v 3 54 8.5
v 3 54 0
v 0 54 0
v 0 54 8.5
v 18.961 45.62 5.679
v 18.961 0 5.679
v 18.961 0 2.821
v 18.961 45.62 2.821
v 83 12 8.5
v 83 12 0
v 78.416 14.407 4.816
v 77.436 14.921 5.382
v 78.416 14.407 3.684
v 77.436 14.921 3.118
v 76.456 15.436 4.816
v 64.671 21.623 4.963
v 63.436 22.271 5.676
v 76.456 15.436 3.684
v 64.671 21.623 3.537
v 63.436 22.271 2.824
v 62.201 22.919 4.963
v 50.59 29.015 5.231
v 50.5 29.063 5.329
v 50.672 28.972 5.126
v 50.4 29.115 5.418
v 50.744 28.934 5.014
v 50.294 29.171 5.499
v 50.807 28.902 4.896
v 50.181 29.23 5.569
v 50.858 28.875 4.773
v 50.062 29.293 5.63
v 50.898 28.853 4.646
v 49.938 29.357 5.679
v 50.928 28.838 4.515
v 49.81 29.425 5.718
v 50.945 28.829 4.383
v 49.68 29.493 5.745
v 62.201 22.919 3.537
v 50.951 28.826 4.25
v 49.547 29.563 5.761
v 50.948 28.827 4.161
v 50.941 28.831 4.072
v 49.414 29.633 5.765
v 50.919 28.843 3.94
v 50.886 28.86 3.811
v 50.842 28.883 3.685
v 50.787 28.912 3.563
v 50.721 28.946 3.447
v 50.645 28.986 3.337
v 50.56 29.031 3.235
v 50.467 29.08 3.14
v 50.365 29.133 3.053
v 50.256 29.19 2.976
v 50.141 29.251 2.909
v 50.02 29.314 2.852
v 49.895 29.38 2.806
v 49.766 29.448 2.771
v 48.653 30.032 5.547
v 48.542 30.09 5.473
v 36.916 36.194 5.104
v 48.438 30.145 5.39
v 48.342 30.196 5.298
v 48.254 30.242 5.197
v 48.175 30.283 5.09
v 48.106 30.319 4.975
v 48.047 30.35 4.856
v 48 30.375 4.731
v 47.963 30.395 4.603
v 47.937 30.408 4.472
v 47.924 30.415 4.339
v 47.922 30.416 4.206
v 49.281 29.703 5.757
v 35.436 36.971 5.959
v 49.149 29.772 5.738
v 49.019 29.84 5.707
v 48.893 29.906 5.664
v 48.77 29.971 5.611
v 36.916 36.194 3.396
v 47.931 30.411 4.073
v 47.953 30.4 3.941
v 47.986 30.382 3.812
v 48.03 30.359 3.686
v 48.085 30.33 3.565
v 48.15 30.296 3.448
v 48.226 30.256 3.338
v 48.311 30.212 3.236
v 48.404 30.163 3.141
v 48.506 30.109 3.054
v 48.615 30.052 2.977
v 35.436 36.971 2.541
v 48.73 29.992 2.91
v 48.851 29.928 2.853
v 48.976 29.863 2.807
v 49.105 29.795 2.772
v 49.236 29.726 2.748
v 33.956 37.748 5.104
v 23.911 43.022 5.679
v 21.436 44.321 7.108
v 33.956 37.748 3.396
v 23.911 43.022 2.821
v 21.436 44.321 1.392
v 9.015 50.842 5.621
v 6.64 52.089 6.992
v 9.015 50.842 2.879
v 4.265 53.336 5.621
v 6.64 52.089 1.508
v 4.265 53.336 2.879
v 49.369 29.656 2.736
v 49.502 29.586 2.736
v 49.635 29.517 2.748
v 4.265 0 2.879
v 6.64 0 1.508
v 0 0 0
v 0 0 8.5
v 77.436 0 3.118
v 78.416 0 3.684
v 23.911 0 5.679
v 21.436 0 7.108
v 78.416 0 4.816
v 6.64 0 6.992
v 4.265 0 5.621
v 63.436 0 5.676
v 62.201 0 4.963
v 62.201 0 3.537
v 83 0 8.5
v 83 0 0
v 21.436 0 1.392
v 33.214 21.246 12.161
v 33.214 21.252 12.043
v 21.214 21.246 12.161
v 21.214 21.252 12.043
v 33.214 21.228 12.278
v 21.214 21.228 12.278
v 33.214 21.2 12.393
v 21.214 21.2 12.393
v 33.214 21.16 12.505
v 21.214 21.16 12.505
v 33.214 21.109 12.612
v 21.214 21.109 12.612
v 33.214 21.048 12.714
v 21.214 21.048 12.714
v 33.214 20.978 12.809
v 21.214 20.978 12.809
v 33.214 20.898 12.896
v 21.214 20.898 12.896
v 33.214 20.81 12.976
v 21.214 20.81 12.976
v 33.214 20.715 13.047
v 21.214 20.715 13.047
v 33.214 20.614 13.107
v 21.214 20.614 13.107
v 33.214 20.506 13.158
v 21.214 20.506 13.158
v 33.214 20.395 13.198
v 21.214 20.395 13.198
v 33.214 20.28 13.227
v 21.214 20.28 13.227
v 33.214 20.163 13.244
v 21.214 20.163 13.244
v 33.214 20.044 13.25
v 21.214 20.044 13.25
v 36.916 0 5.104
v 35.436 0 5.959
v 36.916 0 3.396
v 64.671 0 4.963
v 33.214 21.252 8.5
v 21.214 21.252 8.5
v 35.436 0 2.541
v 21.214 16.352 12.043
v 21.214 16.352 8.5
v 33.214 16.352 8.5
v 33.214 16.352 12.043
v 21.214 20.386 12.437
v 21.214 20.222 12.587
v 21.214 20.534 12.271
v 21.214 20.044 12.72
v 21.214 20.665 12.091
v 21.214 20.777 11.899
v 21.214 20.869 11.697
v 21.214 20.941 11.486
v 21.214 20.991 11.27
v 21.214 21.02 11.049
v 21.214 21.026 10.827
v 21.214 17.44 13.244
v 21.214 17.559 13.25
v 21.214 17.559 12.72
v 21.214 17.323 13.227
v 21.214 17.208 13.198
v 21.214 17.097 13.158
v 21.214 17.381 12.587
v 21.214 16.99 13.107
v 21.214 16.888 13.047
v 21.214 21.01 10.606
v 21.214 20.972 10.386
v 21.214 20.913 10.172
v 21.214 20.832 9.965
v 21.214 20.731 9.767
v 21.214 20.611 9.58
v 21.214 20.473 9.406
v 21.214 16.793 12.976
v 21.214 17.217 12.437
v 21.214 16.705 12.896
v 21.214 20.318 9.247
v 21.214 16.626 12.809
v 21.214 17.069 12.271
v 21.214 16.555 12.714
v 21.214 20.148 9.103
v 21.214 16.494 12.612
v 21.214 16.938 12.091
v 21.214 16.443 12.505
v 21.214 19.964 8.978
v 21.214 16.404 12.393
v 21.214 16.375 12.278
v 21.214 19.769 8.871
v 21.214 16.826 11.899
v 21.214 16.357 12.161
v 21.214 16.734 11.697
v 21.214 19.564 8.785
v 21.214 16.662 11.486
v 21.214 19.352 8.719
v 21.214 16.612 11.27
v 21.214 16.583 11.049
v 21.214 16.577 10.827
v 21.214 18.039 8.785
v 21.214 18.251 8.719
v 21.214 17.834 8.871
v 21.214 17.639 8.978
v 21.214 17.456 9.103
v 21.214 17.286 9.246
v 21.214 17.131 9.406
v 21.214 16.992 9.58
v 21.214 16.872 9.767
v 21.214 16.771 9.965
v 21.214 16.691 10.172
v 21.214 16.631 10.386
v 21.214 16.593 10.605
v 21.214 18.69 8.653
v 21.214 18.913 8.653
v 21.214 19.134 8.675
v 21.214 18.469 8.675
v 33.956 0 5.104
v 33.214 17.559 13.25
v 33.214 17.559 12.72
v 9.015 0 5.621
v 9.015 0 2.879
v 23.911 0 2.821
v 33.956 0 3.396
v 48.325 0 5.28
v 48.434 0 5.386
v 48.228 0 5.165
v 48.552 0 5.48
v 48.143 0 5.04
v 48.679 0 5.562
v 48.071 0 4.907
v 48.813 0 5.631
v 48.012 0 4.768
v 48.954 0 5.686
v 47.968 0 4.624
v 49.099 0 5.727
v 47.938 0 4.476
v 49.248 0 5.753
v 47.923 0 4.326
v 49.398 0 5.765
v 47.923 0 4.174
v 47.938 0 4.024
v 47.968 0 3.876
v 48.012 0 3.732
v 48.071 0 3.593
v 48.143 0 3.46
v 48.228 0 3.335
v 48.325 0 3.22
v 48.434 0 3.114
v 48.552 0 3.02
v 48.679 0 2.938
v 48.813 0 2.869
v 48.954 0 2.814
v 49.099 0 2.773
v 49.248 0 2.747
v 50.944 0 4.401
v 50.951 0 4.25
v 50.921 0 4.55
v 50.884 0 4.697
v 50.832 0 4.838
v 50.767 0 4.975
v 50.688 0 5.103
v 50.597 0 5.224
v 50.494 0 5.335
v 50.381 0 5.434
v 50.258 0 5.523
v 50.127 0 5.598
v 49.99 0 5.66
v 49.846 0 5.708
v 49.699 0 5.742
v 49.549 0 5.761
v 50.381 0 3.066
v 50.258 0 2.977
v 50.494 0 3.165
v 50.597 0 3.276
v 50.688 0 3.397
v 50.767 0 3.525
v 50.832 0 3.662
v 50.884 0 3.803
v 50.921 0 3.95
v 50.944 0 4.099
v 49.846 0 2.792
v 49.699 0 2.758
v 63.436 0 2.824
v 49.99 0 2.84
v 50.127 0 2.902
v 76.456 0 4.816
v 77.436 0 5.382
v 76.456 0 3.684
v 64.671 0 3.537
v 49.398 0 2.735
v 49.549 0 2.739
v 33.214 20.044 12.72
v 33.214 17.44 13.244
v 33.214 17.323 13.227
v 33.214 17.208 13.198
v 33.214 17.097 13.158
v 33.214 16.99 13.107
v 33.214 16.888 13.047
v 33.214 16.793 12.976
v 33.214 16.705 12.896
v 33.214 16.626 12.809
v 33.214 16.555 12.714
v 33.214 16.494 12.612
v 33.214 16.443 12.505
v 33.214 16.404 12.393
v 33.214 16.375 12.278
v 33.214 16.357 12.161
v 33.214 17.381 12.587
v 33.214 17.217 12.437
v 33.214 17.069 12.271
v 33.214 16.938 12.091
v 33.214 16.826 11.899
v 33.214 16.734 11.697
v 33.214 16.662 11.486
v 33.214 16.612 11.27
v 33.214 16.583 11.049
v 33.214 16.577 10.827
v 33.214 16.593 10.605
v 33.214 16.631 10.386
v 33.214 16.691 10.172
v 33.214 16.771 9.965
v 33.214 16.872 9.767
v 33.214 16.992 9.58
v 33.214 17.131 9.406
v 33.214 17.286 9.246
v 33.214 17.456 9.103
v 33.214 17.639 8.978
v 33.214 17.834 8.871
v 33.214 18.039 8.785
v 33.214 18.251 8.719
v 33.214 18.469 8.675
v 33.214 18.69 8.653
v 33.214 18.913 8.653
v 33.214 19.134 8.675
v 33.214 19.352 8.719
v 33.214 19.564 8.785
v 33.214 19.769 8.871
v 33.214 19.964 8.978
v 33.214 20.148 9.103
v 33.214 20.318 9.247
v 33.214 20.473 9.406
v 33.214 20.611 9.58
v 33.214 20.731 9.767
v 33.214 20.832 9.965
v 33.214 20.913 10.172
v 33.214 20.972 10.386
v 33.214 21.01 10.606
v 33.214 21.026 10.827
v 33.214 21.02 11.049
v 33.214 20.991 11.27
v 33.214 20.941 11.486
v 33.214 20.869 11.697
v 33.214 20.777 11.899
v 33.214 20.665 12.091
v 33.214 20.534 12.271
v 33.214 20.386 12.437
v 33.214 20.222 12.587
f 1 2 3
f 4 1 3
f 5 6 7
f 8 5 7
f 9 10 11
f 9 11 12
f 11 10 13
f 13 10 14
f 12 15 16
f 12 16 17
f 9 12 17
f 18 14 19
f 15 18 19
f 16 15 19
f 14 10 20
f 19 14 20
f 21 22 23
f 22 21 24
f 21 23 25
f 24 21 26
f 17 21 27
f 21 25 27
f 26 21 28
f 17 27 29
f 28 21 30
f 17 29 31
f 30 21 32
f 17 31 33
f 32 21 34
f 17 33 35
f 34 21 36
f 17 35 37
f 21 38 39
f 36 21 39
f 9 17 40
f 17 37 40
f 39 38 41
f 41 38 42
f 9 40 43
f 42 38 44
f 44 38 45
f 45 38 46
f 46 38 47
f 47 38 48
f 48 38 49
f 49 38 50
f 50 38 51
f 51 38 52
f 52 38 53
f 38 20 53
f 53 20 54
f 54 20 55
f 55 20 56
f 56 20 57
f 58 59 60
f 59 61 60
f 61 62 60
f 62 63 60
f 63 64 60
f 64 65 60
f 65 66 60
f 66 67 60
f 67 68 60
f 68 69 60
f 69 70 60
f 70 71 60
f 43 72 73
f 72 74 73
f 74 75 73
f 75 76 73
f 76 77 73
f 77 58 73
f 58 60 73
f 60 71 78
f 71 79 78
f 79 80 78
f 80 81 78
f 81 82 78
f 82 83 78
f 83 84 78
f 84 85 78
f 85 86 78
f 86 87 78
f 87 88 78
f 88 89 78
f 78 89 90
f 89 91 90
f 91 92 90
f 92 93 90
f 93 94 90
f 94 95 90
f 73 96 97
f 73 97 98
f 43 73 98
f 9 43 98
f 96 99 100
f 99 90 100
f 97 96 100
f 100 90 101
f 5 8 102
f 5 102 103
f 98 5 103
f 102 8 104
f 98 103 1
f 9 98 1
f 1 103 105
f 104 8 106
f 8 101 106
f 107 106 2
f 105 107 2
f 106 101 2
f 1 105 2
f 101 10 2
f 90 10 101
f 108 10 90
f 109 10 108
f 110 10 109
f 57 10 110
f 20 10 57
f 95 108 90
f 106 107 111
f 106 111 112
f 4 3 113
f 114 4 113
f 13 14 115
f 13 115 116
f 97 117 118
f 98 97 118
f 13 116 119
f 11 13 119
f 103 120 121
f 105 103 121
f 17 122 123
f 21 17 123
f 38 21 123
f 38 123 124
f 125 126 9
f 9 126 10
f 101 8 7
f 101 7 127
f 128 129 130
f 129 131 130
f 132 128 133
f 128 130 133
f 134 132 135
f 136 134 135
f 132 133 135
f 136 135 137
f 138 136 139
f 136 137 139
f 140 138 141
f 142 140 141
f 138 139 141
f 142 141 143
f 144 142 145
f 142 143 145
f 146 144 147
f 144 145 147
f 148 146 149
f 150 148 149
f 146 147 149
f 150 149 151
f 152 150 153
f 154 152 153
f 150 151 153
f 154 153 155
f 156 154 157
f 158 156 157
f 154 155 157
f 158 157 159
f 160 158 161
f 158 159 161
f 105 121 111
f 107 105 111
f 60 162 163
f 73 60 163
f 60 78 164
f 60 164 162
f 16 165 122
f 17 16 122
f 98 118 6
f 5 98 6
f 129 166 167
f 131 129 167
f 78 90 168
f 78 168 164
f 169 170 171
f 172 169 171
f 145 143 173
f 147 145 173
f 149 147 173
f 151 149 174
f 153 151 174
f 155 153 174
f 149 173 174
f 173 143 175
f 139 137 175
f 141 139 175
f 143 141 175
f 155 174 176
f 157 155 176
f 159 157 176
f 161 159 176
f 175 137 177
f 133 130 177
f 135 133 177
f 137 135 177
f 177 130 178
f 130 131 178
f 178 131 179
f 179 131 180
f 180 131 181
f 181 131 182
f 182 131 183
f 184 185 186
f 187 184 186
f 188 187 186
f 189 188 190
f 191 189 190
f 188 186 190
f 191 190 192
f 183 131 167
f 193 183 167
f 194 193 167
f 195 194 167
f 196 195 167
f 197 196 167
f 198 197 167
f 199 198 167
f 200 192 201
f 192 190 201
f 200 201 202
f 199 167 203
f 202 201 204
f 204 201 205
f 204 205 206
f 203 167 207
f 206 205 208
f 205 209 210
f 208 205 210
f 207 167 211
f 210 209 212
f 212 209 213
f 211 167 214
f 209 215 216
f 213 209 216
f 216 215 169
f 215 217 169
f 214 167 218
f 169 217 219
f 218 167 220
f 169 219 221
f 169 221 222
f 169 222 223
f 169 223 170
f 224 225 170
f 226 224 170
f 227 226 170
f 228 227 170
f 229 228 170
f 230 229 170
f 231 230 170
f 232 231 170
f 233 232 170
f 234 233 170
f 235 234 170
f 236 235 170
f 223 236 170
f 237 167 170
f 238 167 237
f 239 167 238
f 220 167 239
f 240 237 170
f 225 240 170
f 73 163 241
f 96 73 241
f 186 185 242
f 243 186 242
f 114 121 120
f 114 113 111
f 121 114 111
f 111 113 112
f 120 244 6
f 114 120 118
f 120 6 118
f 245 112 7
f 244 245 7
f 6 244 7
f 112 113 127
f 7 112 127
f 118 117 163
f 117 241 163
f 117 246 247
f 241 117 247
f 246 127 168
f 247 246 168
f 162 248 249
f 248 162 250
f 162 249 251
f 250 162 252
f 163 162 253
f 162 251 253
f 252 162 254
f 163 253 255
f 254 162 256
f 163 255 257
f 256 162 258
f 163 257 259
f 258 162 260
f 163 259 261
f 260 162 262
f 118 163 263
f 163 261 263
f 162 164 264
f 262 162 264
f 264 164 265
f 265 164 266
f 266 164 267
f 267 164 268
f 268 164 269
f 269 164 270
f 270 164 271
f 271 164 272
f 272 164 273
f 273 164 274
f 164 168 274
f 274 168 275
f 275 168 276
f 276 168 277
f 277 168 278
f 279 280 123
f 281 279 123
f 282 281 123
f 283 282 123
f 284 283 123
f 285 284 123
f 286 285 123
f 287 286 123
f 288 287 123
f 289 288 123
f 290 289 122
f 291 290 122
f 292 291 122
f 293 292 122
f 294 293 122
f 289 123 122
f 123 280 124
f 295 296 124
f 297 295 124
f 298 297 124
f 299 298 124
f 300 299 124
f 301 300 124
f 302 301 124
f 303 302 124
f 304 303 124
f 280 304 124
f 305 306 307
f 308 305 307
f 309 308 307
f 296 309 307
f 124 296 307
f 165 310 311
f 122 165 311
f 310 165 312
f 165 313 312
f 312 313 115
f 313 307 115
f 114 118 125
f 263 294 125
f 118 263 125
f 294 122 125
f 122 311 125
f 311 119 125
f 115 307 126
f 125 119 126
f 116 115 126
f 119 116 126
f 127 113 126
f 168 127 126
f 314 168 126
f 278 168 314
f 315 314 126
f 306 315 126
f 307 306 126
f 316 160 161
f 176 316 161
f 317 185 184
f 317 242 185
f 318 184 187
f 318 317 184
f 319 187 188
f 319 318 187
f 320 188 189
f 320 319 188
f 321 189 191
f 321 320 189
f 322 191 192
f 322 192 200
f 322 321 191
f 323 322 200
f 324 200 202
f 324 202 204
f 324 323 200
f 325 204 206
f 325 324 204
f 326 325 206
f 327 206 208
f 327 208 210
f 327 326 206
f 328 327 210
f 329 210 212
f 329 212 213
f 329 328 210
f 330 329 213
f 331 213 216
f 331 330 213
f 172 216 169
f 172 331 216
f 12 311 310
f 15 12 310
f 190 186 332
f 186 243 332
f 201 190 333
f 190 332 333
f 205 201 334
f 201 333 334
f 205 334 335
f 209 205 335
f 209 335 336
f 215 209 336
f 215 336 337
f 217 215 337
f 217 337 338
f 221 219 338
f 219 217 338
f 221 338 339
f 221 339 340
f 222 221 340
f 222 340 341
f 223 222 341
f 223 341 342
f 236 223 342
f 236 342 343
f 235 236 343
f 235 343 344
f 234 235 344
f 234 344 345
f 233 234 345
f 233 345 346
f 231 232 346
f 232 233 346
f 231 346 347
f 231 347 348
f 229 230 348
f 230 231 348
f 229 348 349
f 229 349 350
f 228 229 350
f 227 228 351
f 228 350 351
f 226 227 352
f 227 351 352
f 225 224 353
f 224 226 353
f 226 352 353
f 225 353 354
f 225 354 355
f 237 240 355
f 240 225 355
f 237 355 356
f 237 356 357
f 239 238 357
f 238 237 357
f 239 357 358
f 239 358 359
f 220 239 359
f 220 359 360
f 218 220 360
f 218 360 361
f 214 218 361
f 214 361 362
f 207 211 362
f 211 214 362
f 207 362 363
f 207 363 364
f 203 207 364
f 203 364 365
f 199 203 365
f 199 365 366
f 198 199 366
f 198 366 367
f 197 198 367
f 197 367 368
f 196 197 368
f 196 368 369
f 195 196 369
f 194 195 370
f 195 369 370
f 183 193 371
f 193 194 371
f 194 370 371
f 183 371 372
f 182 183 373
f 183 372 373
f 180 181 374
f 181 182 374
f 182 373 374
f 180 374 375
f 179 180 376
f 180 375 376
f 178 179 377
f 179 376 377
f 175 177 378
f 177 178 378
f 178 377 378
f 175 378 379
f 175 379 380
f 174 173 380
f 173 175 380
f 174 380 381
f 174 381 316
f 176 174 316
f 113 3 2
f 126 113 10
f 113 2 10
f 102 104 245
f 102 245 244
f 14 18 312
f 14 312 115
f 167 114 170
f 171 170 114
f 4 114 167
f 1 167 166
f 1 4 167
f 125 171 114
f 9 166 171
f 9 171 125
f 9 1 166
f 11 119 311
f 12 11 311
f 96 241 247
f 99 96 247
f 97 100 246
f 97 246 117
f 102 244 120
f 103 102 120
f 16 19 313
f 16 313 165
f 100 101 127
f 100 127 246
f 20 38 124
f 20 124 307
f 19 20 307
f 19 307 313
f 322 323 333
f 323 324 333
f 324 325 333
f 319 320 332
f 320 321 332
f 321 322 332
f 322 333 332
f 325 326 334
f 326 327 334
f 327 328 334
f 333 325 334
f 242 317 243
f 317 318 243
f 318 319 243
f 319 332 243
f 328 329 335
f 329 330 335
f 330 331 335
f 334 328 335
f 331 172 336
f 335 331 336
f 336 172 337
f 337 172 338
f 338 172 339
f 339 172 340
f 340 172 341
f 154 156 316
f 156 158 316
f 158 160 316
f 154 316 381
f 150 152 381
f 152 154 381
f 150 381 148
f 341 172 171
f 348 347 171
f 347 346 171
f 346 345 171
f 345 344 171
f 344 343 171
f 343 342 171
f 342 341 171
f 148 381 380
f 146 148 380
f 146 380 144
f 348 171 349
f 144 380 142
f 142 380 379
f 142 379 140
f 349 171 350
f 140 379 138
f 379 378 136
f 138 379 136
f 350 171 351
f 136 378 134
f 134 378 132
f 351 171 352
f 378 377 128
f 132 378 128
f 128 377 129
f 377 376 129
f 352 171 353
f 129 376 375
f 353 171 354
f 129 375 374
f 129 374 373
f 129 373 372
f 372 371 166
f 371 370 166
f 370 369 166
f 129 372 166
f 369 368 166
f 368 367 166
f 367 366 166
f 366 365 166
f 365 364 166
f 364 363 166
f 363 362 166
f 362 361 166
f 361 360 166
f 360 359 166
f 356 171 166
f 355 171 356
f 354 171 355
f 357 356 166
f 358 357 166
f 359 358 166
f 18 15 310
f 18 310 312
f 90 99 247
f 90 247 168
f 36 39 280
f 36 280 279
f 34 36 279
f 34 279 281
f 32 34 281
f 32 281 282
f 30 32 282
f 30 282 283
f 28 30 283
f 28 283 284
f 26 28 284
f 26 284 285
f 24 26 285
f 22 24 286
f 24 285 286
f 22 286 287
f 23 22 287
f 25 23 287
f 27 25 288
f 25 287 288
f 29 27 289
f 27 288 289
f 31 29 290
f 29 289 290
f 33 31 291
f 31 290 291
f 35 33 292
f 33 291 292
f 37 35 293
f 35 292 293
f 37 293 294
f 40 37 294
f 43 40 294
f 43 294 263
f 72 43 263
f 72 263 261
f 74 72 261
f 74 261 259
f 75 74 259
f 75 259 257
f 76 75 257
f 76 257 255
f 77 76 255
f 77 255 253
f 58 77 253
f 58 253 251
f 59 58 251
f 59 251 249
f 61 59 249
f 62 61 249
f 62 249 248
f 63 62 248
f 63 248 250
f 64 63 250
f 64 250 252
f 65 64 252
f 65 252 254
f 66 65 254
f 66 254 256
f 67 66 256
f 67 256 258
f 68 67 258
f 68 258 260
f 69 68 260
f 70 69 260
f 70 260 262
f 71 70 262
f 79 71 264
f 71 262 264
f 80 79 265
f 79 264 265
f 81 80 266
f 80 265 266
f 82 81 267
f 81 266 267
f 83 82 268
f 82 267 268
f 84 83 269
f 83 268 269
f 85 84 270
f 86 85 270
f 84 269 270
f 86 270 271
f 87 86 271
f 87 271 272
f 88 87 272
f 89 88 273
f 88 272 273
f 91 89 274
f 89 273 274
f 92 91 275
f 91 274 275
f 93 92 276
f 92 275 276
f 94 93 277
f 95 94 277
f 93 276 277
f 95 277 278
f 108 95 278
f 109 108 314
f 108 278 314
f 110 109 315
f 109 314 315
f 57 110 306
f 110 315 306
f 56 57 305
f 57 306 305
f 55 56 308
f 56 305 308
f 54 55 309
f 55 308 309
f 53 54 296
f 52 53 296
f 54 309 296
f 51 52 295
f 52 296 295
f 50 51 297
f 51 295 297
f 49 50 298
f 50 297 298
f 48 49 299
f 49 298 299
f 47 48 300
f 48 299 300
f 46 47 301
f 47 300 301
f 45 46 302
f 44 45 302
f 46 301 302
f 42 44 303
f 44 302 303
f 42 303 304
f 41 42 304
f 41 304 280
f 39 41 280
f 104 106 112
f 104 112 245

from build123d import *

# Parameters (mm, degrees)
F1_DEPTH  = 8.5
F3_DEPTH  = 68.6
F4_W      = 6
F4_H      = 2.45
F5_DEPTH  = 4.75
F6_R      = 2.225
F7_DEPTH  = 25
F8_R      = 1.2071067812
F9_R      = 1.207
F10_DEPTH = 3


with BuildPart() as f1:
    # F0 (on Top) → F1 (new body)
    with BuildSketch(Plane.XY):
        Polygon((0, 54), (0, 0), (83, 0), (83, 12), (3, 54), align=None)
    extrude(amount=F1_DEPTH)

    # F2 (on face) → F3 (cut)
    with BuildSketch(Plane.XZ):
        Polygon((9.015292082, 4.25), (4.265292082, 4.25), (4.265292082, 2.8787931107), (6.640292082, 1.5075862213), (9.015292082, 2.8787931107), align=None)
        Polygon((4.265292082, 5.6212068893), (4.265292082, 4.25), (9.015292082, 4.25), (9.015292082, 5.6212068893), (6.640292082, 6.9924137787), align=None)
        Polygon((18.96107, 5.6789419162), (18.96107, 4.25), (21.43607, 4.25), (23.91107, 4.25), (23.91107, 5.6789419162), (21.43607, 7.1078838325), align=None)
        Polygon((21.43607, 4.25), (18.96107, 4.25), (18.96107, 2.8210580838), (21.43607, 1.3921161675), (23.91107, 2.8210580838), (23.91107, 4.25), align=None)
        Polygon((33.95607, 5.1044783984), (33.95607, 4.25), (35.43607, 4.25), (36.91607, 4.25), (36.91607, 5.1044783984), (35.43607, 5.9589567968), align=None)
        Polygon((35.43607, 4.25), (33.95607, 4.25), (33.95607, 3.3955216016), (35.43607, 2.5410432032), (36.91607, 3.3955216016), (36.91607, 4.25), align=None)
        with BuildLine():
            Line((49.43607, 4.25), (47.92107, 4.25))
            ThreePointArc((47.92107, 4.25), (49.43607, 2.735), (50.95107, 4.25))
            Line((50.95107, 4.25), (49.43607, 4.25))
        make_face()
        with BuildLine():
            ThreePointArc((50.95107, 4.25), (49.43607, 5.765), (47.92107, 4.25))
            Line((47.92107, 4.25), (49.43607, 4.25))
            Line((49.43607, 4.25), (50.95107, 4.25))
        make_face()
        Polygon((62.20107, 4.9630275824), (62.20107, 4.25), (63.43607, 4.25), (64.67107, 4.25), (64.67107, 4.9630275824), (63.43607, 5.6760551649), align=None)
        Polygon((63.43607, 4.25), (62.20107, 4.25), (62.20107, 3.5369724176), (63.43607, 2.8239448351), (64.67107, 3.5369724176), (64.67107, 4.25), align=None)
        Polygon((77.43607, 4.25), (76.45607, 4.25), (76.45607, 3.6841967362), (77.43607, 3.1183934724), (78.41607, 3.6841967362), (78.41607, 4.25), align=None)
        Polygon((76.45607, 4.8158032638), (76.45607, 4.25), (77.43607, 4.25), (78.41607, 4.25), (78.41607, 4.8158032638), (77.43607, 5.3816065276), align=None)
    extrude(amount=-F3_DEPTH, mode=Mode.SUBTRACT)

    # F4 (on face) → F5 (join)
    with BuildSketch(Plane.XY.offset(8.5)):
        with Locations((30.2142857143, 17.5765829772)):
            Rectangle(F4_W, F4_H)
        with Locations((24.2142857143, 20.0265829772)):
            Rectangle(F4_W, F4_H)
        with Locations((24.2142857143, 17.5765829772)):
            Rectangle(F4_W, F4_H)
        with Locations((30.2142857143, 20.0265829772)):
            Rectangle(F4_W, F4_H)
    extrude(amount=F5_DEPTH)

    # F6 (on face) → F7 (cut)
    with BuildSketch(Plane.YZ.offset(33.2142857143)):
        with Locations((18.8015829772, 10.875)):
            Circle(F6_R)
    extrude(amount=-F7_DEPTH, mode=Mode.SUBTRACT)

    # F8
    f8_edges = [f1.edges().sort_by_distance(p)[0] for p in [
        (27.214286, 21.251583, 13.25),
    ]]
    fillet(f8_edges, radius=F8_R)

    # F9
    f9_edges = [f1.edges().sort_by_distance(p)[0] for p in [
        (27.214286, 16.351583, 13.25),
    ]]
    fillet(f9_edges, radius=F9_R)

    # F10 (cut): a face of the model
    f10_faces = [f1.faces().sort_by_distance(p)[0] for p in [
        (27.2142857143, 18.8015295866, 13.25),
    ]]
    extrude(f10_faces, amount=-F10_DEPTH, mode=Mode.SUBTRACT)


solid = f1.part
